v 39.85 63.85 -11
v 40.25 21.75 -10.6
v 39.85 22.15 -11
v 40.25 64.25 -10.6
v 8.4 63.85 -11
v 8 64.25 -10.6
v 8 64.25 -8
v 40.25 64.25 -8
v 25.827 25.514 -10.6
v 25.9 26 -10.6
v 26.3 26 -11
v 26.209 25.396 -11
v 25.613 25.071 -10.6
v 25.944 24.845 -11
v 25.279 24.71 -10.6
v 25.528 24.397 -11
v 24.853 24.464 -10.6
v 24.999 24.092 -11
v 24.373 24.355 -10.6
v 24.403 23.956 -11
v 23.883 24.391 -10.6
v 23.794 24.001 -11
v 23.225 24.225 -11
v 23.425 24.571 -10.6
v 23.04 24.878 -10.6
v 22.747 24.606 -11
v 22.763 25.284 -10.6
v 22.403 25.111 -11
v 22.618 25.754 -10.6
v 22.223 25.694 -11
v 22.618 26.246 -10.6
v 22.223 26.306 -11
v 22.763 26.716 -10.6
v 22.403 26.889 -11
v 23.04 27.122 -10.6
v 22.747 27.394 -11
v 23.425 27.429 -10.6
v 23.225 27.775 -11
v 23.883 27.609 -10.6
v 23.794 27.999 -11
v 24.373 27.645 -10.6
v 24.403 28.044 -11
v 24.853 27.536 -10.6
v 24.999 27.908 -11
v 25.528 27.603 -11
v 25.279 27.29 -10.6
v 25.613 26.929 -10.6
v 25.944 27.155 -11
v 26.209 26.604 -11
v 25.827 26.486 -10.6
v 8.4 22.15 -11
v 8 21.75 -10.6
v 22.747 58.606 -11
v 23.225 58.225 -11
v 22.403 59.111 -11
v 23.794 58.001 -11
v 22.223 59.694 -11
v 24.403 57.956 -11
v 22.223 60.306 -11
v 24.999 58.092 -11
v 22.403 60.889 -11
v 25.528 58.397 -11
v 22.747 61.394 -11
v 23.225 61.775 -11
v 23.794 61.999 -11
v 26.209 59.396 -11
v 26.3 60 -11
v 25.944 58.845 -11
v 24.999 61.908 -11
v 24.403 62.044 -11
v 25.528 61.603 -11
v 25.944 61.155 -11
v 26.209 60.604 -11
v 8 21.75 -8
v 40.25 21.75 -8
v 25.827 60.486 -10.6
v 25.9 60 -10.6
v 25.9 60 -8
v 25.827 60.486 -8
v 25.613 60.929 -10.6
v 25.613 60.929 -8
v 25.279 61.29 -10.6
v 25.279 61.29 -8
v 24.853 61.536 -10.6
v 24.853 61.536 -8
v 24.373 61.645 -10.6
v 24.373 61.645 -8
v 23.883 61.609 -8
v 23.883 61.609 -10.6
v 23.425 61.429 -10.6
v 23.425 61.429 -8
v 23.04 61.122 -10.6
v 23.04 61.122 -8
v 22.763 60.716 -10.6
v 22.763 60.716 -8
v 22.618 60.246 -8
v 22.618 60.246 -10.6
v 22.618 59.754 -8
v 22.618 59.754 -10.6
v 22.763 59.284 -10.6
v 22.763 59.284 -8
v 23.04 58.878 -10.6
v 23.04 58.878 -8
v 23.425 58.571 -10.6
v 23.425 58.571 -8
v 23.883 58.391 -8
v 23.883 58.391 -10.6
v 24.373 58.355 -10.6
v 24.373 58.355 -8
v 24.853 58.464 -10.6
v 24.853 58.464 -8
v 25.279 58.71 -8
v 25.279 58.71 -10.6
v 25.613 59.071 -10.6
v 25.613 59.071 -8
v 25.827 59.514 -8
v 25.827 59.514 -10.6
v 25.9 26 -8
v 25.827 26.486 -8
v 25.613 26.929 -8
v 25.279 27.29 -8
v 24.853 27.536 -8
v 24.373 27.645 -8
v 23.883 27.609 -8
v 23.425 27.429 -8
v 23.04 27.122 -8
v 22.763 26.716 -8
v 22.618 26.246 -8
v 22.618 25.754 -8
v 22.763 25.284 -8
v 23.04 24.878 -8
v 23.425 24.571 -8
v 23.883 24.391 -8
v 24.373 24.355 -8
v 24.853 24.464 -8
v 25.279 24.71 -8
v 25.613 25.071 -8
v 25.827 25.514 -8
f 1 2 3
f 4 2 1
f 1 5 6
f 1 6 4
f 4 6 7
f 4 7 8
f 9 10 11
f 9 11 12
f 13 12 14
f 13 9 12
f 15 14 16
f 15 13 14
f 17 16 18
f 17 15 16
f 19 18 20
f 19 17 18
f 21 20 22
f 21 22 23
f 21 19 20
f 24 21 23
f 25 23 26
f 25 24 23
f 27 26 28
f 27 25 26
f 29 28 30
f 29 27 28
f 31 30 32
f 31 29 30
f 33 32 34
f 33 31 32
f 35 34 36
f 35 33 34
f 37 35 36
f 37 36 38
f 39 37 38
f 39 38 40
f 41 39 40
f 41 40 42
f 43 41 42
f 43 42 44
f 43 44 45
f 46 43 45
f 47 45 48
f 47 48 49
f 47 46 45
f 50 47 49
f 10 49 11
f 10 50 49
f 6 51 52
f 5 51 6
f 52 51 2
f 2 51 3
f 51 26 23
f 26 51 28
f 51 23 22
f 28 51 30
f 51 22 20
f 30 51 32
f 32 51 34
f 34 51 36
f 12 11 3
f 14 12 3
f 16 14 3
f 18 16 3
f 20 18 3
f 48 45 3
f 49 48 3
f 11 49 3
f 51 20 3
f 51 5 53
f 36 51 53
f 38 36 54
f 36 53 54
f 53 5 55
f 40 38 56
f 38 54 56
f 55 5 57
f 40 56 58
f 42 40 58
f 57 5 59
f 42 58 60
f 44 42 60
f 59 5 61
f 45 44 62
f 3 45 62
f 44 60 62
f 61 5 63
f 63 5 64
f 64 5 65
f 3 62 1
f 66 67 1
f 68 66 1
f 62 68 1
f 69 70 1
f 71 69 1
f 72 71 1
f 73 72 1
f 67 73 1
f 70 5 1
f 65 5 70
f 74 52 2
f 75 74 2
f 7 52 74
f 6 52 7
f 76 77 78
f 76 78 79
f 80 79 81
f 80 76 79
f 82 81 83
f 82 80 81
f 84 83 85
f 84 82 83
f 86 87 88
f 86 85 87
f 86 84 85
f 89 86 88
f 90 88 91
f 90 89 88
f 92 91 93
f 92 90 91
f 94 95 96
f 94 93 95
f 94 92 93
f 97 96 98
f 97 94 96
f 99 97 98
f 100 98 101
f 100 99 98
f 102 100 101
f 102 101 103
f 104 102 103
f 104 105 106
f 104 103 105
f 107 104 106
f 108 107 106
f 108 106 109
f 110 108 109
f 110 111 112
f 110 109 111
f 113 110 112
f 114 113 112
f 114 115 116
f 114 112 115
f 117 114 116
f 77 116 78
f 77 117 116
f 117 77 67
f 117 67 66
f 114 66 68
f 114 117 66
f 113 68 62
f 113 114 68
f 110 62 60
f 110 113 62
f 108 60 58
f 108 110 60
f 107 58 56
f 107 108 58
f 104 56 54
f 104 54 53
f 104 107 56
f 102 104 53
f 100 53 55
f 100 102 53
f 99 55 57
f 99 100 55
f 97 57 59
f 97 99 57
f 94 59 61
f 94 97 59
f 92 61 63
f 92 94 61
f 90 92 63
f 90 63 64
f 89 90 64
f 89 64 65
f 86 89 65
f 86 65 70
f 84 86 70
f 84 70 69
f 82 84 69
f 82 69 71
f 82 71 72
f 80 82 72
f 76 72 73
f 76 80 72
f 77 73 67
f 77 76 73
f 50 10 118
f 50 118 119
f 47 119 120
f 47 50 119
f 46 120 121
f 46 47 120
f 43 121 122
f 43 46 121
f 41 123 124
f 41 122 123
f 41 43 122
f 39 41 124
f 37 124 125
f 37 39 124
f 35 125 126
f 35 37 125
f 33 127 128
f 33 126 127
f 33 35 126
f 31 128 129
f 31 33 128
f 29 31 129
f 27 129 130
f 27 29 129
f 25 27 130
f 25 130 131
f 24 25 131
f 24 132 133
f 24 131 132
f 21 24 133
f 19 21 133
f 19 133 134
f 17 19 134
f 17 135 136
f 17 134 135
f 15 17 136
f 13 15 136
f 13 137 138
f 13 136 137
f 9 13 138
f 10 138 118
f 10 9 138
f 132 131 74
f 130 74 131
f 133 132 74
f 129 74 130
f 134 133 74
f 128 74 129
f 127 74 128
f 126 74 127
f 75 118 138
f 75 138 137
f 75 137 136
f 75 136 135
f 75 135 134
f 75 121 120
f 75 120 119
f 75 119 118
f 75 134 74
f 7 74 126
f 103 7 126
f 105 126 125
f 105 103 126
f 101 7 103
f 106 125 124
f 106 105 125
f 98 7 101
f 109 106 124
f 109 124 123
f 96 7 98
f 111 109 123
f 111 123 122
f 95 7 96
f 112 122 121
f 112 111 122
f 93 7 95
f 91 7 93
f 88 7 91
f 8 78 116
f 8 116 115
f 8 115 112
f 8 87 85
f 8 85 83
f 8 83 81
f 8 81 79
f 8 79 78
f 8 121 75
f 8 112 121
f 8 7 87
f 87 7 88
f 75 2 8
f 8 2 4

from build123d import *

# Parameters (mm, degrees)
CYLINDER043_R            = 1.65
CYLINDER043_DEPTH        = 10
CYLINDER044_R            = 1.65
CYLINDER044_DEPTH        = 10
BOX049_W                 = 32.25
BOX049_H                 = 42.5
BOX049_DEPTH             = 3
CHAMFER029006005013_SIZE = 0.4


with BuildPart() as cylinder043:
    # Cylinder043 → Cylinder043 (new body)
    with BuildSketch(Plane(origin=(24.25, 26, -13), x_dir=(1, 0, 0), z_dir=(0, 0, 1))):
        Circle(CYLINDER043_R)
    extrude(amount=CYLINDER043_DEPTH)


with BuildPart() as fusion006002011004053036004001_body:
    # Cylinder044 → Cylinder044 (new body)
    with BuildSketch(Plane(origin=(24.25, 60, -13), x_dir=(1, 0, 0), z_dir=(0, 0, 1))):
        Circle(CYLINDER044_R)
    extrude(amount=CYLINDER044_DEPTH)

    # Fusion006002011004053036004001028003011014: union Cylinder043
    add(cylinder043.part)


with BuildPart() as bottom_cover_r002:
    # Box049 → Box049 (new body)
    with BuildSketch(Plane(origin=(8, 21.75, -11), x_dir=(1, 0, 0), z_dir=(0, 0, 1))):
        with Locations((16.125, 21.25)):
            Rectangle(BOX049_W, BOX049_H)
    extrude(amount=BOX049_DEPTH)

    # Cut001024014003001002006005007: cut Fusion006002011004053036004001 body
    add(fusion006002011004053036004001_body.part, mode=Mode.SUBTRACT)

    # Chamfer029006005013
    chamfer029006005013_edges = [bottom_cover_r002.edges().sort_by_distance(p)[0] for p in [
        (8, 43, -11),
        (24.125, 21.75, -11),
        (24.125, 64.25, -11),
        (40.25, 43, -11),
        (22.6, 26, -11),
        (22.6, 60, -11),
    ]]
    chamfer(chamfer029006005013_edges, length=CHAMFER029006005013_SIZE)


solid = bottom_cover_r002.part
